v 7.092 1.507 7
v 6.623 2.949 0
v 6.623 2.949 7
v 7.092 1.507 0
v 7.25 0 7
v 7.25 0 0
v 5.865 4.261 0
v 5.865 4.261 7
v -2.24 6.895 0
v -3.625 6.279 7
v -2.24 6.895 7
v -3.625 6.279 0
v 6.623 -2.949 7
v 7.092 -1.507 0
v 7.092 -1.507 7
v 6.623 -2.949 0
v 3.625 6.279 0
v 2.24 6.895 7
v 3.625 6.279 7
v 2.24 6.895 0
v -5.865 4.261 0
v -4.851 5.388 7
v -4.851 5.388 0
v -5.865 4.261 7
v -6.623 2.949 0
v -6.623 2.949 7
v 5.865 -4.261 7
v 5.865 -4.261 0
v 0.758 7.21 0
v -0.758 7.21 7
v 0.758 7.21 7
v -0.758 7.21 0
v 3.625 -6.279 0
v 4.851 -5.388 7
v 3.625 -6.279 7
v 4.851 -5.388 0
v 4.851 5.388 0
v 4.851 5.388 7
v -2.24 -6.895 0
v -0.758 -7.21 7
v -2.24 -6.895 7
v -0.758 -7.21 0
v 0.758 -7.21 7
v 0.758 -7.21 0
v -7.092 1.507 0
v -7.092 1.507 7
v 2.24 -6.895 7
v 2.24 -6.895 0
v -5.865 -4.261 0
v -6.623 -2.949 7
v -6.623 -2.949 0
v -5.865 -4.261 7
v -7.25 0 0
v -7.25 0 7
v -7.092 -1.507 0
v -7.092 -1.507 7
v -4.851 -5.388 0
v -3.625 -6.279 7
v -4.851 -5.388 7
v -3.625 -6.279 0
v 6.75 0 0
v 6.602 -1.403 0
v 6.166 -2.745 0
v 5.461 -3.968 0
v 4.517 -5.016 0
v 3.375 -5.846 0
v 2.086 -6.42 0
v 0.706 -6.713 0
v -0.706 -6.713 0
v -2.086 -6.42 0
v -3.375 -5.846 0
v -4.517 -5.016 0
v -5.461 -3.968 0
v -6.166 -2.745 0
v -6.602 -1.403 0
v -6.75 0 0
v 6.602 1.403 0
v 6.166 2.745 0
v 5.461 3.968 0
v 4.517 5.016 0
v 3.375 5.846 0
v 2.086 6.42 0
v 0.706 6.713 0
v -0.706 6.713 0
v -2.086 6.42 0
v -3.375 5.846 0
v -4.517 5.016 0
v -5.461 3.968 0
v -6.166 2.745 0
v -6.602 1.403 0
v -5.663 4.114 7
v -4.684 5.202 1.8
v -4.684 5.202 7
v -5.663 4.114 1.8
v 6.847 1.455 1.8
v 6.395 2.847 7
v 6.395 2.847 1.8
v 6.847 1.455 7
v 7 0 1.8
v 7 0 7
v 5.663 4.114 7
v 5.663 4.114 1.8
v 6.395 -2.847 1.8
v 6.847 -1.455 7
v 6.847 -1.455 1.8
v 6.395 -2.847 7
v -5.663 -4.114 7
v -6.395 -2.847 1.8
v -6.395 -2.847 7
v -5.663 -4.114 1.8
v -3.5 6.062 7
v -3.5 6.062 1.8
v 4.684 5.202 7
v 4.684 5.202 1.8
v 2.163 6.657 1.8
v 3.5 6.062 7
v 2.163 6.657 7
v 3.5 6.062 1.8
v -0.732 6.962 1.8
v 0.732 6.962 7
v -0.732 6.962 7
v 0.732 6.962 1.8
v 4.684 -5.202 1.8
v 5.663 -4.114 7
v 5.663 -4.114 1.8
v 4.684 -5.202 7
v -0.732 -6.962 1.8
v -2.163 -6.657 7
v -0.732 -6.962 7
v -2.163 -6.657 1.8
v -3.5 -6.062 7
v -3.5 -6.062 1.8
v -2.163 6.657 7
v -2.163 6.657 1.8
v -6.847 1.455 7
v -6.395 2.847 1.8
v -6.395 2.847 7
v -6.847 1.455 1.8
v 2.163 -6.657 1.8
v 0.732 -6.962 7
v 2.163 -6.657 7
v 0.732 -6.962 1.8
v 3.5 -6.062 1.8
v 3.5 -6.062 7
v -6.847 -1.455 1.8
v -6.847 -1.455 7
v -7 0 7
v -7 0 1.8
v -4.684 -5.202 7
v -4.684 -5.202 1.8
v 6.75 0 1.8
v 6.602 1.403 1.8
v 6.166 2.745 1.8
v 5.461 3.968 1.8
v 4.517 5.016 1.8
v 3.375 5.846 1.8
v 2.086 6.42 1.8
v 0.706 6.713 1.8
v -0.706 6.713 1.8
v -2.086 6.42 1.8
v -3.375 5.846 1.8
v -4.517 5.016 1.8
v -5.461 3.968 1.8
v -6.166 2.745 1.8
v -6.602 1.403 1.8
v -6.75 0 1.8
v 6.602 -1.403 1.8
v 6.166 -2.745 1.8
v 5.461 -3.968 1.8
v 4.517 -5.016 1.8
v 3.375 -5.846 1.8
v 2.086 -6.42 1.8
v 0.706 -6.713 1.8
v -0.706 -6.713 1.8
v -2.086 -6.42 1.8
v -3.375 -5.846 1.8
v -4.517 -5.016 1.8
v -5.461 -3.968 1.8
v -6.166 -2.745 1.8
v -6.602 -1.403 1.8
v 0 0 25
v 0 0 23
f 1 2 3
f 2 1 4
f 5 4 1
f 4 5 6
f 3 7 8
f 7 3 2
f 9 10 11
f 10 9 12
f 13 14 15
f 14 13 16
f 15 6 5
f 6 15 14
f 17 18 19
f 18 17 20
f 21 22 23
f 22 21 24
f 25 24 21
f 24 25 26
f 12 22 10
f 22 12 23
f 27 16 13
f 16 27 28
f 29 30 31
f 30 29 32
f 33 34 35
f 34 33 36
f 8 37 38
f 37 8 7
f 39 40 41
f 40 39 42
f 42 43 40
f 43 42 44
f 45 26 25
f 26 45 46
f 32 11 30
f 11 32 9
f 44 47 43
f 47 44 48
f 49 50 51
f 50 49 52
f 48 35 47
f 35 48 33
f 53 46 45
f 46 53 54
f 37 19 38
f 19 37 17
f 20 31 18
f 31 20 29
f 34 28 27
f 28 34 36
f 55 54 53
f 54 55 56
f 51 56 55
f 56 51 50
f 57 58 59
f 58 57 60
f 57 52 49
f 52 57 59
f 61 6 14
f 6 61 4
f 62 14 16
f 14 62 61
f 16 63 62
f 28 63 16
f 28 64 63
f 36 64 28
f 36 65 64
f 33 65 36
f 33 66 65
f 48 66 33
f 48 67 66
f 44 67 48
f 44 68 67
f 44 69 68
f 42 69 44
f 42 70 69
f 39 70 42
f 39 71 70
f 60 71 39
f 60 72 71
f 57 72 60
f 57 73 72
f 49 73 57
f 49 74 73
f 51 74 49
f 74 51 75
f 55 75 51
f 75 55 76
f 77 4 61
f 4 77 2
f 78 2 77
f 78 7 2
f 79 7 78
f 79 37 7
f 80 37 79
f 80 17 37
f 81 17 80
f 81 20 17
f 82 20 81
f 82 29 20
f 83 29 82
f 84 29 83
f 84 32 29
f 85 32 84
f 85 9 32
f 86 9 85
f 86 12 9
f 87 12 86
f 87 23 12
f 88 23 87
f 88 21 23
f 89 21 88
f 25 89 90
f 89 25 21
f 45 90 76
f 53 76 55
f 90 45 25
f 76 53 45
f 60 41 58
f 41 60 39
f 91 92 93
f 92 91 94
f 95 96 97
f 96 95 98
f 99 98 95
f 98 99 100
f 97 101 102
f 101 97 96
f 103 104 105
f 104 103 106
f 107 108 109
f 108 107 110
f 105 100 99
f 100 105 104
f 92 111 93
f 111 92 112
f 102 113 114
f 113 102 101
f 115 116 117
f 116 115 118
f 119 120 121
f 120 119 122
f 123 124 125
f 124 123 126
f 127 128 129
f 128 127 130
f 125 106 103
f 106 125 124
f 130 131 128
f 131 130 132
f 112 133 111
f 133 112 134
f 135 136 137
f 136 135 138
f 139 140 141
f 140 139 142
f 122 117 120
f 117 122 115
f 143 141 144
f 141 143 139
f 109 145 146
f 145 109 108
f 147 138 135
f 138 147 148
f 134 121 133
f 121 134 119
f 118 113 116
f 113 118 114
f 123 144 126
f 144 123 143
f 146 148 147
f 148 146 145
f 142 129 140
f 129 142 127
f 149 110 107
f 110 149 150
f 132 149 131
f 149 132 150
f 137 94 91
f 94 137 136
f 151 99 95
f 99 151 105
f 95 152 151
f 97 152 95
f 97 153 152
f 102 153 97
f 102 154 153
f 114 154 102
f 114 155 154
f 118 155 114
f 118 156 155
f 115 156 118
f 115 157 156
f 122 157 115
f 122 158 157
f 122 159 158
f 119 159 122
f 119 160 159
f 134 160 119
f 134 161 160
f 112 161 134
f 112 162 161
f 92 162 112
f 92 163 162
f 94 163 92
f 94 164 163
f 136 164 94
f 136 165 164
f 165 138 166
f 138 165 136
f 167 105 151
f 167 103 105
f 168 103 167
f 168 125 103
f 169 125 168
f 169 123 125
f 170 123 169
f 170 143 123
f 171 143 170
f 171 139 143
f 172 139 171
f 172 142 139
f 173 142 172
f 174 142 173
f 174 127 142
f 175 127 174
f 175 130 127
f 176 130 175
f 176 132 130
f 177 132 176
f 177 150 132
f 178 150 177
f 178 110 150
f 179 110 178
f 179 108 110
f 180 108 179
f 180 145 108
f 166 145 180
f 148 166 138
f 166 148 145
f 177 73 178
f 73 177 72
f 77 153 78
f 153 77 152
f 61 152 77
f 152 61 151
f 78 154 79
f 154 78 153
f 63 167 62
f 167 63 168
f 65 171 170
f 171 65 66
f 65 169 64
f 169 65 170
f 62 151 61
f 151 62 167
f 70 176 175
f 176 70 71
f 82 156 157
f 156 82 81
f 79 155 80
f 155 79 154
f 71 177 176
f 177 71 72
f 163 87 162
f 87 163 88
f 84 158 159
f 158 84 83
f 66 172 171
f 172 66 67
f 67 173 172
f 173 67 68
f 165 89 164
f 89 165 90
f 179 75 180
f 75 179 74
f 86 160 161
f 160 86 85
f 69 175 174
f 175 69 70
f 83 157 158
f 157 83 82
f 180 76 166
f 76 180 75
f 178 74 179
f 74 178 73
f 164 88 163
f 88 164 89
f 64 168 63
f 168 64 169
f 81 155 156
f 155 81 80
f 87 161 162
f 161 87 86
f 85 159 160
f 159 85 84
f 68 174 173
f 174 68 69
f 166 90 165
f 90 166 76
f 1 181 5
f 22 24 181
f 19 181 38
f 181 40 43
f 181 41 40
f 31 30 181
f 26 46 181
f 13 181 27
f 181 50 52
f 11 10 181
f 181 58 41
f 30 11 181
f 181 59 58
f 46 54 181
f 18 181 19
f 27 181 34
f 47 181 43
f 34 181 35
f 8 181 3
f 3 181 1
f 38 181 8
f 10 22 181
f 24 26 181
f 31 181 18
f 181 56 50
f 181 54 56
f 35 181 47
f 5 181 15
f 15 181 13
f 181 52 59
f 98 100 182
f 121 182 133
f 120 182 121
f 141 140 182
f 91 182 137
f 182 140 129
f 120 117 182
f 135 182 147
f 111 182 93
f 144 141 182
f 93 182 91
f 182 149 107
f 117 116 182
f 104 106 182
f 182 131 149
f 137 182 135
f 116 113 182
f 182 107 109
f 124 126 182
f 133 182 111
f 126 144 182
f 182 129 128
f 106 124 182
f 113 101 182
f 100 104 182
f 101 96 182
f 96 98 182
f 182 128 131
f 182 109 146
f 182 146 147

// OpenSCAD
h=25;
v=7;
di = 1;
module pennedop() {
$fs=0.1;
	difference() {
		cylinder(v,(12.5/2)+di,(12.5/2)+di);
		translate([0,0,-0.1])cylinder(v+0.11,(12/2)+di,(12/2)+di);
	}


	difference() {
		cylinder(1.8,(12/2)+di,(12/2)+di);
		cylinder(1.8,(11.5/2)+di,(11.5/2)+di);
	}

	difference(){
		translate([0,0,v]) cylinder(h-v,(12.5/2)+di,0);
		translate([0,0,v]) cylinder(h-v-2,(12/2)+di,0);
	}




}

pennedop();
